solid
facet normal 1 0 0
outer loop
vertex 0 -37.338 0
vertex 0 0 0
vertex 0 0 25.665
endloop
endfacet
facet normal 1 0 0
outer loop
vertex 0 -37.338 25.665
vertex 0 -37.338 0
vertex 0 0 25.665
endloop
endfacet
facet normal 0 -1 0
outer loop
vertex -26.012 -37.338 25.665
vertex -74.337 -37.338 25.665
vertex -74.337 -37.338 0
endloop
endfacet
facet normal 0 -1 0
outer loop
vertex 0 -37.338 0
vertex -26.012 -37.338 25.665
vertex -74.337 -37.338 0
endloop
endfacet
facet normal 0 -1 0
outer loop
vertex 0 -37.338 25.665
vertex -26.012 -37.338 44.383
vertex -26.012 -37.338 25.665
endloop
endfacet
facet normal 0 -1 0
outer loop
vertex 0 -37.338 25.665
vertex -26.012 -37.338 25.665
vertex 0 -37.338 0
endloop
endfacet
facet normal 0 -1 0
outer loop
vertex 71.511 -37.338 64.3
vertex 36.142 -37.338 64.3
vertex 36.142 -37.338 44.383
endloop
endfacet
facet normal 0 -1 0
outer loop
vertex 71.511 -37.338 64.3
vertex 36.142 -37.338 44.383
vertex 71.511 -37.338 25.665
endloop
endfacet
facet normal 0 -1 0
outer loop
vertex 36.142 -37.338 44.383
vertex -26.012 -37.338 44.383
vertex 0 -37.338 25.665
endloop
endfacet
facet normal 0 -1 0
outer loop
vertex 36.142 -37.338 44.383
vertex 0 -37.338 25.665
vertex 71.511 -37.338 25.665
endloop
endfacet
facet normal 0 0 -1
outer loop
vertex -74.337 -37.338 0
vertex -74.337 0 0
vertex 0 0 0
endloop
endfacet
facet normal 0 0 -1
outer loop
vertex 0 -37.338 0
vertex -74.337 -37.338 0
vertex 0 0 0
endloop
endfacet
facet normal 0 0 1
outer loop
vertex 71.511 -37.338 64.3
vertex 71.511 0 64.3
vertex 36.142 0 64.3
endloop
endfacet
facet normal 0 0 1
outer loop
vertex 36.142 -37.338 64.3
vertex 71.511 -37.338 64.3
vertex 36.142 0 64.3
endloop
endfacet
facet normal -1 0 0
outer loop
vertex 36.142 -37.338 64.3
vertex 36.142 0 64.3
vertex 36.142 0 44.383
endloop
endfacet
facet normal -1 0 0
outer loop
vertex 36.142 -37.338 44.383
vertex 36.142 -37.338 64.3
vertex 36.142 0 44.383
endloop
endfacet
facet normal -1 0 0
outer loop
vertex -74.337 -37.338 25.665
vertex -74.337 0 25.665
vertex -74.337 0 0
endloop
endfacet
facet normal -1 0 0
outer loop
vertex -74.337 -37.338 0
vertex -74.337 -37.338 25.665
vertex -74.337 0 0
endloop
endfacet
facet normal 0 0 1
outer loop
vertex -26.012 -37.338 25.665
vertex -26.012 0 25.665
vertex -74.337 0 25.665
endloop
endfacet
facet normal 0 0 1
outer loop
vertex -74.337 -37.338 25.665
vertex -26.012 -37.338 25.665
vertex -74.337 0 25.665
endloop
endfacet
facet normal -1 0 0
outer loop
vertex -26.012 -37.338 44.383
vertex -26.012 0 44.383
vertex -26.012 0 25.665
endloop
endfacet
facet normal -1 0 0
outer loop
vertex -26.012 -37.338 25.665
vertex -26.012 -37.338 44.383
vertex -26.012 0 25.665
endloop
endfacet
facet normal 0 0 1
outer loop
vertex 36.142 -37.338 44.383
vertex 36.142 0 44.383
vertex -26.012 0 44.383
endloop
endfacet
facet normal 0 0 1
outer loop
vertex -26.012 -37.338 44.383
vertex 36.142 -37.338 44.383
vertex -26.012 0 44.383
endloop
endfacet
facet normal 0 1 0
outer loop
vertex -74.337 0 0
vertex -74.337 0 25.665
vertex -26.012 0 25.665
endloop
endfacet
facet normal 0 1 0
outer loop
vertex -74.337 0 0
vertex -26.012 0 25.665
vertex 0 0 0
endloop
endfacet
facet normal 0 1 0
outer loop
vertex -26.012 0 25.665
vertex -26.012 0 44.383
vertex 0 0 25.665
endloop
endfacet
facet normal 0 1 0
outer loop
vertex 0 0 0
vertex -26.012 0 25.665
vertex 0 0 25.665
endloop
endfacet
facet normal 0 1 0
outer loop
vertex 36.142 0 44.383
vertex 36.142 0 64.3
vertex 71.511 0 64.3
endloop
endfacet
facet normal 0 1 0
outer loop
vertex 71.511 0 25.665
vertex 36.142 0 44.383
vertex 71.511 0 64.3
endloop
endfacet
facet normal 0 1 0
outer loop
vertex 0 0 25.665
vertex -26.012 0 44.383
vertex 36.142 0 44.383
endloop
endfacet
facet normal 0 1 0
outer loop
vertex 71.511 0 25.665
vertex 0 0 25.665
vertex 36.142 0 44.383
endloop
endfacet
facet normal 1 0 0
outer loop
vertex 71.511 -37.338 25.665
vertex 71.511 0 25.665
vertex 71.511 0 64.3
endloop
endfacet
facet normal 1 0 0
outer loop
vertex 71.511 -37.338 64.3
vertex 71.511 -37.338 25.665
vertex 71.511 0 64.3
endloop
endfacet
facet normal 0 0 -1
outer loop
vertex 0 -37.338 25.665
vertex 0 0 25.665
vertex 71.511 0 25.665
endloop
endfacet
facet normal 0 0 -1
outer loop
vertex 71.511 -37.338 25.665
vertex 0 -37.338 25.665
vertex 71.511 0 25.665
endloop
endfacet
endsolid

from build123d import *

# Parameters (mm, degrees)
F1_DEPTH = 37.338


with BuildPart() as f1:
    # F0 (on Front) → F1 (new body)
    with BuildSketch(Plane.XZ):
        Polygon((36.141854, 44.383232), (71.51109, 44.383232), (71.51109, 64.299881), (53.826472, 64.299881), (36.141854, 64.299881), align=None)
        Polygon((-74.336521, 0), (0, 0), (0, 25.665386), (-26.011834, 25.665386), (-74.336521, 25.665386), align=None)
        Polygon((-26.011834, 25.665386), (0, 25.665386), (71.51109, 25.665386), (71.51109, 44.383232), (36.141854, 44.383232), (-26.011834, 44.383232), align=None)
    extrude(amount=F1_DEPTH)


solid = f1.part
